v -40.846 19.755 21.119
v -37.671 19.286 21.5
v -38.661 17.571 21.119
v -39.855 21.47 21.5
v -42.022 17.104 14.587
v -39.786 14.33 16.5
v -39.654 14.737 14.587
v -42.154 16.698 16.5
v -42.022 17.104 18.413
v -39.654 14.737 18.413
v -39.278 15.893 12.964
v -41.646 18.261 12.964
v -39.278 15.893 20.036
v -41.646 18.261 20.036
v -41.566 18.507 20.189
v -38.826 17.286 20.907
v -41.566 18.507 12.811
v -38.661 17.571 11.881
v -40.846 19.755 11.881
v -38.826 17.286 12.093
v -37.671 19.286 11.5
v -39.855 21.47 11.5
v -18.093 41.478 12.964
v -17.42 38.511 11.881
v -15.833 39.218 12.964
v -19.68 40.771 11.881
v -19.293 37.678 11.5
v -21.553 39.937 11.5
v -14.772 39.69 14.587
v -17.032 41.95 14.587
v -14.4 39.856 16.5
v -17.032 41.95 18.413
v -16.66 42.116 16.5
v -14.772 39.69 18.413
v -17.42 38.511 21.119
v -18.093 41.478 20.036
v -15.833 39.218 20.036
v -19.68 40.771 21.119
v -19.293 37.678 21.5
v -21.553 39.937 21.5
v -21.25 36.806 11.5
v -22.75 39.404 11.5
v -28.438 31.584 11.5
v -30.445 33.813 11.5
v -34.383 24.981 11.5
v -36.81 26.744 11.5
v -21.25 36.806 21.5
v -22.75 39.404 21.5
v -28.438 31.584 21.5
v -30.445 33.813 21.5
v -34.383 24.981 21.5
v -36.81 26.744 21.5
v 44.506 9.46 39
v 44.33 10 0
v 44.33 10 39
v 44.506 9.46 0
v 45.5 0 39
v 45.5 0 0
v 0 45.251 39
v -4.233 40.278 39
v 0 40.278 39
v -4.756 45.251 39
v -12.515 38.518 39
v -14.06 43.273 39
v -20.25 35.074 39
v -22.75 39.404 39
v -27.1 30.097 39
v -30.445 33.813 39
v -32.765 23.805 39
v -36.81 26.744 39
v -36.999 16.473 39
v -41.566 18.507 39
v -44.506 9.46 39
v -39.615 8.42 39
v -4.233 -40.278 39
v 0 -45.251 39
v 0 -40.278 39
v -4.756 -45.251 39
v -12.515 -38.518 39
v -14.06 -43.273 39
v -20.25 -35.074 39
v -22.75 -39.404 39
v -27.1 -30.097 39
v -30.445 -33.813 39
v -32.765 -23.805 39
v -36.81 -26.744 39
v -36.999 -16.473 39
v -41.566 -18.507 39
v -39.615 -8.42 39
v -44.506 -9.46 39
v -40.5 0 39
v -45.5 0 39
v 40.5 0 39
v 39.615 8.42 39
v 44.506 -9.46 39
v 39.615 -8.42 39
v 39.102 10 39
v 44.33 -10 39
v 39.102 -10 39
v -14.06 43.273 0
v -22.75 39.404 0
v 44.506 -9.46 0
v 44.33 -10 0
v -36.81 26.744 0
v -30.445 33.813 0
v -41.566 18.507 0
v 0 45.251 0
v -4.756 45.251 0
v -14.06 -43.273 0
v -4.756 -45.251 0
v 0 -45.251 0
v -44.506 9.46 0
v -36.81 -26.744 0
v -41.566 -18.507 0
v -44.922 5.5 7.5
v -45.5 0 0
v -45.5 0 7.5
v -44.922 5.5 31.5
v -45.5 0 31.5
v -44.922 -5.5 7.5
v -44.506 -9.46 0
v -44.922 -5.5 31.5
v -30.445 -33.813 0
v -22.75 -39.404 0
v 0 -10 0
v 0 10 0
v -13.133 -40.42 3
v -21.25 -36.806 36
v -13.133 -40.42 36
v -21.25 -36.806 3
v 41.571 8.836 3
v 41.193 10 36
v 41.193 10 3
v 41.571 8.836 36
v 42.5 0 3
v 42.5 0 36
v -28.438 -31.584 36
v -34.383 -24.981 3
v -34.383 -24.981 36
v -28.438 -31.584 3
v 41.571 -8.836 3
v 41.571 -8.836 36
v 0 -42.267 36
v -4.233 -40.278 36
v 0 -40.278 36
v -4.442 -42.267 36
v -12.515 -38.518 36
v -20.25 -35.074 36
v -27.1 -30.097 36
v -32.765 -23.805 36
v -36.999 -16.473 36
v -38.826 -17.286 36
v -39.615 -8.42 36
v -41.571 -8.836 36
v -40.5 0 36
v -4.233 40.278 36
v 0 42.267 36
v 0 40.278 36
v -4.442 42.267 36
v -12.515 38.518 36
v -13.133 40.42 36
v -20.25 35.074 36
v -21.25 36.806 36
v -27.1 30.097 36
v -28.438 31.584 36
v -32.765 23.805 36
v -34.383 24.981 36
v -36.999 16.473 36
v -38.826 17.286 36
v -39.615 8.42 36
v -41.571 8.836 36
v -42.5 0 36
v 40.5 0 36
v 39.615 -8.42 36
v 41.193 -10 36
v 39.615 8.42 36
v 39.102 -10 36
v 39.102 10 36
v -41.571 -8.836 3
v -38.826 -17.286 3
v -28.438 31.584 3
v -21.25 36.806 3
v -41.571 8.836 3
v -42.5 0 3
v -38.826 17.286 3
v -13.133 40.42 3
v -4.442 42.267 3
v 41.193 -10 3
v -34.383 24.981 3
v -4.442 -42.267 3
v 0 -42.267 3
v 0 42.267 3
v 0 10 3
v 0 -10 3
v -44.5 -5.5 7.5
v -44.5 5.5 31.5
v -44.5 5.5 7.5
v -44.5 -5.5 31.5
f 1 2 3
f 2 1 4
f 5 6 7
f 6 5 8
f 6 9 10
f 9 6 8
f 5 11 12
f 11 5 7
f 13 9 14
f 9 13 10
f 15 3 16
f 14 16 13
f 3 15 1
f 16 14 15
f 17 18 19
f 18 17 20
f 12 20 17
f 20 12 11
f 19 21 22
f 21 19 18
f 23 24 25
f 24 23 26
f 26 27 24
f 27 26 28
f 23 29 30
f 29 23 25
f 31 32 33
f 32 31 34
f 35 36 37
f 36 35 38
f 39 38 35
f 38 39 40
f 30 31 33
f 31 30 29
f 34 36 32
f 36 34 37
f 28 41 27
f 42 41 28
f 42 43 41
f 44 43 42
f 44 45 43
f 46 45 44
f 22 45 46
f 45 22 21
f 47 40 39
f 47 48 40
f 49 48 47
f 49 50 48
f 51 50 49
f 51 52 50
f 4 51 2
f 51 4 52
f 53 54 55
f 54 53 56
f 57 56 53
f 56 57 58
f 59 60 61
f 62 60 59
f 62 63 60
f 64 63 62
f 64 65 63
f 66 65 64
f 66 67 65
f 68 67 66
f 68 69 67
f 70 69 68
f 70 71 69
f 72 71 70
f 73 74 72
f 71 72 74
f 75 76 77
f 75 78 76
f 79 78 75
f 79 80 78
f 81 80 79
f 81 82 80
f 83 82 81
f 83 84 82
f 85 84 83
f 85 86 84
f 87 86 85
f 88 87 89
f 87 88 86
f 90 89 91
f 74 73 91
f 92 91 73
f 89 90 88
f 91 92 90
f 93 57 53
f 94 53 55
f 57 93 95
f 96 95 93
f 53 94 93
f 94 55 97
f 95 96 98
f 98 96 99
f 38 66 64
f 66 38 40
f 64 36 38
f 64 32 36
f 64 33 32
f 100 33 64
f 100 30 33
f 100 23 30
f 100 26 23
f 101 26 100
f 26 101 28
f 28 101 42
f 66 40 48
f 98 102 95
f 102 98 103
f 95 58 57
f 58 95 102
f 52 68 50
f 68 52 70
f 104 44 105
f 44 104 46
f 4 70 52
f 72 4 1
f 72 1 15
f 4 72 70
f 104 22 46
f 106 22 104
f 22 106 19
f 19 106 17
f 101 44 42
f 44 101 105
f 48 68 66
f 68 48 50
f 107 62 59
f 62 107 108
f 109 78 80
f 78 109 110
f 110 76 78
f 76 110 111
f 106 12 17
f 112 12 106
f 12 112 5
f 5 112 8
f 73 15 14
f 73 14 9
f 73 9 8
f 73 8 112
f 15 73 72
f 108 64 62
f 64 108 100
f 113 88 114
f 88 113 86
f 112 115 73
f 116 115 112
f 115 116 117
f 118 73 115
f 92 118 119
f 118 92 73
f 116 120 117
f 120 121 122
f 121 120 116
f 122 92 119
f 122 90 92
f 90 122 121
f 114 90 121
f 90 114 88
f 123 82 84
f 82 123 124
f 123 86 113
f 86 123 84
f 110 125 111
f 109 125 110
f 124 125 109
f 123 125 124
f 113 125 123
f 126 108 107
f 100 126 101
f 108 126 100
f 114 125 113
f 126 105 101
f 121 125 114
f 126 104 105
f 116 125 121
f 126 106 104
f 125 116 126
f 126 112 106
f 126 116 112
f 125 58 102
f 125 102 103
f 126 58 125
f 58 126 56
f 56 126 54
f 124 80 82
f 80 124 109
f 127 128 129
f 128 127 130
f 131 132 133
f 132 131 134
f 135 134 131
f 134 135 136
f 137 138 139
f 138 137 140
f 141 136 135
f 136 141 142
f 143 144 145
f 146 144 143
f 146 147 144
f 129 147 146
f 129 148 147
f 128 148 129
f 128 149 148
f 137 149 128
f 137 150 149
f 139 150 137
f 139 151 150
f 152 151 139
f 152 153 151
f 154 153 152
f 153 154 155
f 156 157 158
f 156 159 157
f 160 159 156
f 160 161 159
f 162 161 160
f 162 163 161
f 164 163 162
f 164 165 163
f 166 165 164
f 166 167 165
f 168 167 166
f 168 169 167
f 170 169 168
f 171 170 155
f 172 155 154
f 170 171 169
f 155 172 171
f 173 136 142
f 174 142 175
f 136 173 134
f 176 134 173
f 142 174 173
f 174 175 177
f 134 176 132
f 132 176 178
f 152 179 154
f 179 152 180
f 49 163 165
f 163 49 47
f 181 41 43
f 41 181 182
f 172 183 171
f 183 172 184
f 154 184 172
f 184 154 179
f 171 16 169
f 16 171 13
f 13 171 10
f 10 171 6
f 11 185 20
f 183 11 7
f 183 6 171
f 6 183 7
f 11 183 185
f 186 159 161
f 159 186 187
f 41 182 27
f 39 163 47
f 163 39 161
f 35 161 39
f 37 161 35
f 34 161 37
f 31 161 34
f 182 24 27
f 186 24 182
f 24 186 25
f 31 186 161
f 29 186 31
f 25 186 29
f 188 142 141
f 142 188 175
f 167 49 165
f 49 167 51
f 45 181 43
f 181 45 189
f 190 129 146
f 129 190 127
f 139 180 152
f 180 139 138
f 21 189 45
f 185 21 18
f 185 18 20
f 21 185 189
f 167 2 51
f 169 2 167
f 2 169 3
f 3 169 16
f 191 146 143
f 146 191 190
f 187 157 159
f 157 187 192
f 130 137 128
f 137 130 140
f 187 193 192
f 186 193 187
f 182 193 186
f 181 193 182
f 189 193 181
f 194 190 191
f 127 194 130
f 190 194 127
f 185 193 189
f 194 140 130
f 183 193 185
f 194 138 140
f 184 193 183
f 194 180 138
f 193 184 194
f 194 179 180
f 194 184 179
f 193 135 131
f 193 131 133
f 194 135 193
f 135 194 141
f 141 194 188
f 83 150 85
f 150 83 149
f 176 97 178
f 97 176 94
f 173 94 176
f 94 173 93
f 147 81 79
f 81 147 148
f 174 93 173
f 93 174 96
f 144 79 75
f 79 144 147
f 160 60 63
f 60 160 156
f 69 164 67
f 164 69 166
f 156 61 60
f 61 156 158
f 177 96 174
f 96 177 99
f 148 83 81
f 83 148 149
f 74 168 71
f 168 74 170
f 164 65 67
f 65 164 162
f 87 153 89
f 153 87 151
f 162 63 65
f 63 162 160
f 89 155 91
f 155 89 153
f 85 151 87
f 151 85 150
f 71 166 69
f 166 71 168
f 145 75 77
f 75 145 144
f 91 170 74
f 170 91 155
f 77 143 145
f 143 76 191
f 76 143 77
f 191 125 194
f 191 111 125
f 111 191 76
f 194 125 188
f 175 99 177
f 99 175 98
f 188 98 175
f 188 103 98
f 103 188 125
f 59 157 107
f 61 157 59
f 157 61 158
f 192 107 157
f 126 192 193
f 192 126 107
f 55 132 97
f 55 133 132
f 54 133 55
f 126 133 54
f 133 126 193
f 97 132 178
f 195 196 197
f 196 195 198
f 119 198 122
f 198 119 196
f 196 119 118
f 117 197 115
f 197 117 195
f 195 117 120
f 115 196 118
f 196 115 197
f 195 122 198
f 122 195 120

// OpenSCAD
/**
 * Echo Dot (2nd generation) upgrade to Echo Dude.
 * Based on "Echo Dude" by redbobpants, https://www.thingiverse.com/thing:2894087
 * @author Robert Schrenk
 * @date 2018-07-10
**/

/* General Options */
// Print a solid back
has_back=1; // [0, 1]

/* Customize Dot Dimensions */
// Width of dot in mm
dot_diameter=85;
// Height of dot in mm
dot_height=33;
// Overhang to hold the dot in mm
dot_overhang=4; // [2,4,6,8]
// Overhang in the top middle to hold the spot in mm, only works when has_back is set to 1
dot_top_overhang=20;

/* Customize Connectors */
// distance from cable-hole from bottom of dot in mm
cable_from_back=9;
// height of cable-hole in mm
cable_height=10;
// width of cable-hole in mm
cable_width=26;
// rotation of cable hole in degree
cable_rotate=-45;

/* Customize Glue Spot */
// Glue spot
gluespot_depth = 1;
gluespot_height = 24;
gluespot_width = 11;

// Do not customize below this line
// width of walls
wall_width=3*1;

difference() {
    cylinder(d=dot_diameter+2*wall_width,h=dot_height+2*wall_width);
    // This is the dot itself
    translate([0,0,wall_width])
        cylinder(d=dot_diameter,h=dot_height);
    if(has_back==1) {
        translate([0,0,wall_width])
            cylinder(d=dot_diameter-dot_overhang,h=dot_height+3*wall_width);
    } else {
        translate([0,0,-2*wall_width+1])
            cylinder(d=dot_diameter-dot_overhang,h=dot_height+4*wall_width);
        // Also cut off the dot_top_overhang
        translate([0,-(dot_diameter+2*wall_width)/2,-wall_width])
        cube([(dot_diameter+2*wall_width),(dot_diameter+2*wall_width),dot_height+4*wall_width]);
    }
    // Cut off upper left area
    translate([0,-(dot_diameter+2*wall_width)/2-dot_top_overhang/2,-wall_width])
        cube([(dot_diameter+2*wall_width)/2,(dot_diameter+2*wall_width)/2,dot_height+4*wall_width]);
    // Cut off upper right area
    translate([0,dot_top_overhang/2,-wall_width])
        cube([(dot_diameter+2*wall_width)/2,(dot_diameter+2*wall_width)/2,dot_height+4*wall_width]);
    rotate([0,0,cable_rotate])
        connectors();
    gluespot();
}

module gluespot() {
    translate([-dot_diameter/2-wall_width,-gluespot_width/2,(dot_height+2*wall_width-gluespot_height)/2])
        cube([gluespot_depth,gluespot_width,gluespot_height]);
}

module connectors(){
    translate([-dot_diameter,0,cable_from_back+wall_width])
    rotate([0,90,0]) {
        translate([-cable_from_back/2,-cable_width/2,0])
            cylinder(d=cable_height,h=dot_diameter);
        translate([-cable_from_back/2,cable_width/2,0])
            cylinder(d=cable_height,h=dot_diameter);
        translate([-cable_from_back/2-cable_height/2,-cable_width/2,0])
            cube([cable_height,cable_width,dot_diameter]);
    }
}
